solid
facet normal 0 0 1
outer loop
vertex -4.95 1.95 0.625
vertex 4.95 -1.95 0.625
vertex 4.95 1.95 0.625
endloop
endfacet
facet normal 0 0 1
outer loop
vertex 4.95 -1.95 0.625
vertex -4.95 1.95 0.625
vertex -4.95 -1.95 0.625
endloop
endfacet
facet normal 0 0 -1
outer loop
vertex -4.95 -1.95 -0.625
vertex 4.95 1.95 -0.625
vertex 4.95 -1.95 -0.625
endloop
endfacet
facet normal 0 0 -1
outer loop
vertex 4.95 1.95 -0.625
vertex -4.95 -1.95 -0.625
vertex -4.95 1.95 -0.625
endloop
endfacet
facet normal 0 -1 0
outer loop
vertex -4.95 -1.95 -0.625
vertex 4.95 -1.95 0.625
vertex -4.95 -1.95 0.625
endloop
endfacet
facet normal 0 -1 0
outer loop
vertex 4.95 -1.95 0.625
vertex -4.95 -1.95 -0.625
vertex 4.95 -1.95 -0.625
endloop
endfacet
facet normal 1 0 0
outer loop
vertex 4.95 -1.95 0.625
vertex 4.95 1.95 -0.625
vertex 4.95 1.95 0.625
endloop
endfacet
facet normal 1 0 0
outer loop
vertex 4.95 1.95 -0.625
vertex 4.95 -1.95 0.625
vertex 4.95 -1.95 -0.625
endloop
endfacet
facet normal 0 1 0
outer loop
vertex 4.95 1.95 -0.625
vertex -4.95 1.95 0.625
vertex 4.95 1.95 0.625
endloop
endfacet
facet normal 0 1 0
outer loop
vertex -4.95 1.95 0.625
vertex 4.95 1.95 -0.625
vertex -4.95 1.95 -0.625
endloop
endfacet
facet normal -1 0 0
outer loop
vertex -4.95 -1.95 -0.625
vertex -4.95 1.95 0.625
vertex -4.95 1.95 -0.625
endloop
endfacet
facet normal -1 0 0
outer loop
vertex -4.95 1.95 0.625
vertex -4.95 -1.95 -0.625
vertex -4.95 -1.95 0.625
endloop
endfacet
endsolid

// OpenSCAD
module smd() {
    translate([-9.90/2, -3.90/2, -1.25/2])
        cube([9.90, 3.90, 1.25]);
}

smd();
